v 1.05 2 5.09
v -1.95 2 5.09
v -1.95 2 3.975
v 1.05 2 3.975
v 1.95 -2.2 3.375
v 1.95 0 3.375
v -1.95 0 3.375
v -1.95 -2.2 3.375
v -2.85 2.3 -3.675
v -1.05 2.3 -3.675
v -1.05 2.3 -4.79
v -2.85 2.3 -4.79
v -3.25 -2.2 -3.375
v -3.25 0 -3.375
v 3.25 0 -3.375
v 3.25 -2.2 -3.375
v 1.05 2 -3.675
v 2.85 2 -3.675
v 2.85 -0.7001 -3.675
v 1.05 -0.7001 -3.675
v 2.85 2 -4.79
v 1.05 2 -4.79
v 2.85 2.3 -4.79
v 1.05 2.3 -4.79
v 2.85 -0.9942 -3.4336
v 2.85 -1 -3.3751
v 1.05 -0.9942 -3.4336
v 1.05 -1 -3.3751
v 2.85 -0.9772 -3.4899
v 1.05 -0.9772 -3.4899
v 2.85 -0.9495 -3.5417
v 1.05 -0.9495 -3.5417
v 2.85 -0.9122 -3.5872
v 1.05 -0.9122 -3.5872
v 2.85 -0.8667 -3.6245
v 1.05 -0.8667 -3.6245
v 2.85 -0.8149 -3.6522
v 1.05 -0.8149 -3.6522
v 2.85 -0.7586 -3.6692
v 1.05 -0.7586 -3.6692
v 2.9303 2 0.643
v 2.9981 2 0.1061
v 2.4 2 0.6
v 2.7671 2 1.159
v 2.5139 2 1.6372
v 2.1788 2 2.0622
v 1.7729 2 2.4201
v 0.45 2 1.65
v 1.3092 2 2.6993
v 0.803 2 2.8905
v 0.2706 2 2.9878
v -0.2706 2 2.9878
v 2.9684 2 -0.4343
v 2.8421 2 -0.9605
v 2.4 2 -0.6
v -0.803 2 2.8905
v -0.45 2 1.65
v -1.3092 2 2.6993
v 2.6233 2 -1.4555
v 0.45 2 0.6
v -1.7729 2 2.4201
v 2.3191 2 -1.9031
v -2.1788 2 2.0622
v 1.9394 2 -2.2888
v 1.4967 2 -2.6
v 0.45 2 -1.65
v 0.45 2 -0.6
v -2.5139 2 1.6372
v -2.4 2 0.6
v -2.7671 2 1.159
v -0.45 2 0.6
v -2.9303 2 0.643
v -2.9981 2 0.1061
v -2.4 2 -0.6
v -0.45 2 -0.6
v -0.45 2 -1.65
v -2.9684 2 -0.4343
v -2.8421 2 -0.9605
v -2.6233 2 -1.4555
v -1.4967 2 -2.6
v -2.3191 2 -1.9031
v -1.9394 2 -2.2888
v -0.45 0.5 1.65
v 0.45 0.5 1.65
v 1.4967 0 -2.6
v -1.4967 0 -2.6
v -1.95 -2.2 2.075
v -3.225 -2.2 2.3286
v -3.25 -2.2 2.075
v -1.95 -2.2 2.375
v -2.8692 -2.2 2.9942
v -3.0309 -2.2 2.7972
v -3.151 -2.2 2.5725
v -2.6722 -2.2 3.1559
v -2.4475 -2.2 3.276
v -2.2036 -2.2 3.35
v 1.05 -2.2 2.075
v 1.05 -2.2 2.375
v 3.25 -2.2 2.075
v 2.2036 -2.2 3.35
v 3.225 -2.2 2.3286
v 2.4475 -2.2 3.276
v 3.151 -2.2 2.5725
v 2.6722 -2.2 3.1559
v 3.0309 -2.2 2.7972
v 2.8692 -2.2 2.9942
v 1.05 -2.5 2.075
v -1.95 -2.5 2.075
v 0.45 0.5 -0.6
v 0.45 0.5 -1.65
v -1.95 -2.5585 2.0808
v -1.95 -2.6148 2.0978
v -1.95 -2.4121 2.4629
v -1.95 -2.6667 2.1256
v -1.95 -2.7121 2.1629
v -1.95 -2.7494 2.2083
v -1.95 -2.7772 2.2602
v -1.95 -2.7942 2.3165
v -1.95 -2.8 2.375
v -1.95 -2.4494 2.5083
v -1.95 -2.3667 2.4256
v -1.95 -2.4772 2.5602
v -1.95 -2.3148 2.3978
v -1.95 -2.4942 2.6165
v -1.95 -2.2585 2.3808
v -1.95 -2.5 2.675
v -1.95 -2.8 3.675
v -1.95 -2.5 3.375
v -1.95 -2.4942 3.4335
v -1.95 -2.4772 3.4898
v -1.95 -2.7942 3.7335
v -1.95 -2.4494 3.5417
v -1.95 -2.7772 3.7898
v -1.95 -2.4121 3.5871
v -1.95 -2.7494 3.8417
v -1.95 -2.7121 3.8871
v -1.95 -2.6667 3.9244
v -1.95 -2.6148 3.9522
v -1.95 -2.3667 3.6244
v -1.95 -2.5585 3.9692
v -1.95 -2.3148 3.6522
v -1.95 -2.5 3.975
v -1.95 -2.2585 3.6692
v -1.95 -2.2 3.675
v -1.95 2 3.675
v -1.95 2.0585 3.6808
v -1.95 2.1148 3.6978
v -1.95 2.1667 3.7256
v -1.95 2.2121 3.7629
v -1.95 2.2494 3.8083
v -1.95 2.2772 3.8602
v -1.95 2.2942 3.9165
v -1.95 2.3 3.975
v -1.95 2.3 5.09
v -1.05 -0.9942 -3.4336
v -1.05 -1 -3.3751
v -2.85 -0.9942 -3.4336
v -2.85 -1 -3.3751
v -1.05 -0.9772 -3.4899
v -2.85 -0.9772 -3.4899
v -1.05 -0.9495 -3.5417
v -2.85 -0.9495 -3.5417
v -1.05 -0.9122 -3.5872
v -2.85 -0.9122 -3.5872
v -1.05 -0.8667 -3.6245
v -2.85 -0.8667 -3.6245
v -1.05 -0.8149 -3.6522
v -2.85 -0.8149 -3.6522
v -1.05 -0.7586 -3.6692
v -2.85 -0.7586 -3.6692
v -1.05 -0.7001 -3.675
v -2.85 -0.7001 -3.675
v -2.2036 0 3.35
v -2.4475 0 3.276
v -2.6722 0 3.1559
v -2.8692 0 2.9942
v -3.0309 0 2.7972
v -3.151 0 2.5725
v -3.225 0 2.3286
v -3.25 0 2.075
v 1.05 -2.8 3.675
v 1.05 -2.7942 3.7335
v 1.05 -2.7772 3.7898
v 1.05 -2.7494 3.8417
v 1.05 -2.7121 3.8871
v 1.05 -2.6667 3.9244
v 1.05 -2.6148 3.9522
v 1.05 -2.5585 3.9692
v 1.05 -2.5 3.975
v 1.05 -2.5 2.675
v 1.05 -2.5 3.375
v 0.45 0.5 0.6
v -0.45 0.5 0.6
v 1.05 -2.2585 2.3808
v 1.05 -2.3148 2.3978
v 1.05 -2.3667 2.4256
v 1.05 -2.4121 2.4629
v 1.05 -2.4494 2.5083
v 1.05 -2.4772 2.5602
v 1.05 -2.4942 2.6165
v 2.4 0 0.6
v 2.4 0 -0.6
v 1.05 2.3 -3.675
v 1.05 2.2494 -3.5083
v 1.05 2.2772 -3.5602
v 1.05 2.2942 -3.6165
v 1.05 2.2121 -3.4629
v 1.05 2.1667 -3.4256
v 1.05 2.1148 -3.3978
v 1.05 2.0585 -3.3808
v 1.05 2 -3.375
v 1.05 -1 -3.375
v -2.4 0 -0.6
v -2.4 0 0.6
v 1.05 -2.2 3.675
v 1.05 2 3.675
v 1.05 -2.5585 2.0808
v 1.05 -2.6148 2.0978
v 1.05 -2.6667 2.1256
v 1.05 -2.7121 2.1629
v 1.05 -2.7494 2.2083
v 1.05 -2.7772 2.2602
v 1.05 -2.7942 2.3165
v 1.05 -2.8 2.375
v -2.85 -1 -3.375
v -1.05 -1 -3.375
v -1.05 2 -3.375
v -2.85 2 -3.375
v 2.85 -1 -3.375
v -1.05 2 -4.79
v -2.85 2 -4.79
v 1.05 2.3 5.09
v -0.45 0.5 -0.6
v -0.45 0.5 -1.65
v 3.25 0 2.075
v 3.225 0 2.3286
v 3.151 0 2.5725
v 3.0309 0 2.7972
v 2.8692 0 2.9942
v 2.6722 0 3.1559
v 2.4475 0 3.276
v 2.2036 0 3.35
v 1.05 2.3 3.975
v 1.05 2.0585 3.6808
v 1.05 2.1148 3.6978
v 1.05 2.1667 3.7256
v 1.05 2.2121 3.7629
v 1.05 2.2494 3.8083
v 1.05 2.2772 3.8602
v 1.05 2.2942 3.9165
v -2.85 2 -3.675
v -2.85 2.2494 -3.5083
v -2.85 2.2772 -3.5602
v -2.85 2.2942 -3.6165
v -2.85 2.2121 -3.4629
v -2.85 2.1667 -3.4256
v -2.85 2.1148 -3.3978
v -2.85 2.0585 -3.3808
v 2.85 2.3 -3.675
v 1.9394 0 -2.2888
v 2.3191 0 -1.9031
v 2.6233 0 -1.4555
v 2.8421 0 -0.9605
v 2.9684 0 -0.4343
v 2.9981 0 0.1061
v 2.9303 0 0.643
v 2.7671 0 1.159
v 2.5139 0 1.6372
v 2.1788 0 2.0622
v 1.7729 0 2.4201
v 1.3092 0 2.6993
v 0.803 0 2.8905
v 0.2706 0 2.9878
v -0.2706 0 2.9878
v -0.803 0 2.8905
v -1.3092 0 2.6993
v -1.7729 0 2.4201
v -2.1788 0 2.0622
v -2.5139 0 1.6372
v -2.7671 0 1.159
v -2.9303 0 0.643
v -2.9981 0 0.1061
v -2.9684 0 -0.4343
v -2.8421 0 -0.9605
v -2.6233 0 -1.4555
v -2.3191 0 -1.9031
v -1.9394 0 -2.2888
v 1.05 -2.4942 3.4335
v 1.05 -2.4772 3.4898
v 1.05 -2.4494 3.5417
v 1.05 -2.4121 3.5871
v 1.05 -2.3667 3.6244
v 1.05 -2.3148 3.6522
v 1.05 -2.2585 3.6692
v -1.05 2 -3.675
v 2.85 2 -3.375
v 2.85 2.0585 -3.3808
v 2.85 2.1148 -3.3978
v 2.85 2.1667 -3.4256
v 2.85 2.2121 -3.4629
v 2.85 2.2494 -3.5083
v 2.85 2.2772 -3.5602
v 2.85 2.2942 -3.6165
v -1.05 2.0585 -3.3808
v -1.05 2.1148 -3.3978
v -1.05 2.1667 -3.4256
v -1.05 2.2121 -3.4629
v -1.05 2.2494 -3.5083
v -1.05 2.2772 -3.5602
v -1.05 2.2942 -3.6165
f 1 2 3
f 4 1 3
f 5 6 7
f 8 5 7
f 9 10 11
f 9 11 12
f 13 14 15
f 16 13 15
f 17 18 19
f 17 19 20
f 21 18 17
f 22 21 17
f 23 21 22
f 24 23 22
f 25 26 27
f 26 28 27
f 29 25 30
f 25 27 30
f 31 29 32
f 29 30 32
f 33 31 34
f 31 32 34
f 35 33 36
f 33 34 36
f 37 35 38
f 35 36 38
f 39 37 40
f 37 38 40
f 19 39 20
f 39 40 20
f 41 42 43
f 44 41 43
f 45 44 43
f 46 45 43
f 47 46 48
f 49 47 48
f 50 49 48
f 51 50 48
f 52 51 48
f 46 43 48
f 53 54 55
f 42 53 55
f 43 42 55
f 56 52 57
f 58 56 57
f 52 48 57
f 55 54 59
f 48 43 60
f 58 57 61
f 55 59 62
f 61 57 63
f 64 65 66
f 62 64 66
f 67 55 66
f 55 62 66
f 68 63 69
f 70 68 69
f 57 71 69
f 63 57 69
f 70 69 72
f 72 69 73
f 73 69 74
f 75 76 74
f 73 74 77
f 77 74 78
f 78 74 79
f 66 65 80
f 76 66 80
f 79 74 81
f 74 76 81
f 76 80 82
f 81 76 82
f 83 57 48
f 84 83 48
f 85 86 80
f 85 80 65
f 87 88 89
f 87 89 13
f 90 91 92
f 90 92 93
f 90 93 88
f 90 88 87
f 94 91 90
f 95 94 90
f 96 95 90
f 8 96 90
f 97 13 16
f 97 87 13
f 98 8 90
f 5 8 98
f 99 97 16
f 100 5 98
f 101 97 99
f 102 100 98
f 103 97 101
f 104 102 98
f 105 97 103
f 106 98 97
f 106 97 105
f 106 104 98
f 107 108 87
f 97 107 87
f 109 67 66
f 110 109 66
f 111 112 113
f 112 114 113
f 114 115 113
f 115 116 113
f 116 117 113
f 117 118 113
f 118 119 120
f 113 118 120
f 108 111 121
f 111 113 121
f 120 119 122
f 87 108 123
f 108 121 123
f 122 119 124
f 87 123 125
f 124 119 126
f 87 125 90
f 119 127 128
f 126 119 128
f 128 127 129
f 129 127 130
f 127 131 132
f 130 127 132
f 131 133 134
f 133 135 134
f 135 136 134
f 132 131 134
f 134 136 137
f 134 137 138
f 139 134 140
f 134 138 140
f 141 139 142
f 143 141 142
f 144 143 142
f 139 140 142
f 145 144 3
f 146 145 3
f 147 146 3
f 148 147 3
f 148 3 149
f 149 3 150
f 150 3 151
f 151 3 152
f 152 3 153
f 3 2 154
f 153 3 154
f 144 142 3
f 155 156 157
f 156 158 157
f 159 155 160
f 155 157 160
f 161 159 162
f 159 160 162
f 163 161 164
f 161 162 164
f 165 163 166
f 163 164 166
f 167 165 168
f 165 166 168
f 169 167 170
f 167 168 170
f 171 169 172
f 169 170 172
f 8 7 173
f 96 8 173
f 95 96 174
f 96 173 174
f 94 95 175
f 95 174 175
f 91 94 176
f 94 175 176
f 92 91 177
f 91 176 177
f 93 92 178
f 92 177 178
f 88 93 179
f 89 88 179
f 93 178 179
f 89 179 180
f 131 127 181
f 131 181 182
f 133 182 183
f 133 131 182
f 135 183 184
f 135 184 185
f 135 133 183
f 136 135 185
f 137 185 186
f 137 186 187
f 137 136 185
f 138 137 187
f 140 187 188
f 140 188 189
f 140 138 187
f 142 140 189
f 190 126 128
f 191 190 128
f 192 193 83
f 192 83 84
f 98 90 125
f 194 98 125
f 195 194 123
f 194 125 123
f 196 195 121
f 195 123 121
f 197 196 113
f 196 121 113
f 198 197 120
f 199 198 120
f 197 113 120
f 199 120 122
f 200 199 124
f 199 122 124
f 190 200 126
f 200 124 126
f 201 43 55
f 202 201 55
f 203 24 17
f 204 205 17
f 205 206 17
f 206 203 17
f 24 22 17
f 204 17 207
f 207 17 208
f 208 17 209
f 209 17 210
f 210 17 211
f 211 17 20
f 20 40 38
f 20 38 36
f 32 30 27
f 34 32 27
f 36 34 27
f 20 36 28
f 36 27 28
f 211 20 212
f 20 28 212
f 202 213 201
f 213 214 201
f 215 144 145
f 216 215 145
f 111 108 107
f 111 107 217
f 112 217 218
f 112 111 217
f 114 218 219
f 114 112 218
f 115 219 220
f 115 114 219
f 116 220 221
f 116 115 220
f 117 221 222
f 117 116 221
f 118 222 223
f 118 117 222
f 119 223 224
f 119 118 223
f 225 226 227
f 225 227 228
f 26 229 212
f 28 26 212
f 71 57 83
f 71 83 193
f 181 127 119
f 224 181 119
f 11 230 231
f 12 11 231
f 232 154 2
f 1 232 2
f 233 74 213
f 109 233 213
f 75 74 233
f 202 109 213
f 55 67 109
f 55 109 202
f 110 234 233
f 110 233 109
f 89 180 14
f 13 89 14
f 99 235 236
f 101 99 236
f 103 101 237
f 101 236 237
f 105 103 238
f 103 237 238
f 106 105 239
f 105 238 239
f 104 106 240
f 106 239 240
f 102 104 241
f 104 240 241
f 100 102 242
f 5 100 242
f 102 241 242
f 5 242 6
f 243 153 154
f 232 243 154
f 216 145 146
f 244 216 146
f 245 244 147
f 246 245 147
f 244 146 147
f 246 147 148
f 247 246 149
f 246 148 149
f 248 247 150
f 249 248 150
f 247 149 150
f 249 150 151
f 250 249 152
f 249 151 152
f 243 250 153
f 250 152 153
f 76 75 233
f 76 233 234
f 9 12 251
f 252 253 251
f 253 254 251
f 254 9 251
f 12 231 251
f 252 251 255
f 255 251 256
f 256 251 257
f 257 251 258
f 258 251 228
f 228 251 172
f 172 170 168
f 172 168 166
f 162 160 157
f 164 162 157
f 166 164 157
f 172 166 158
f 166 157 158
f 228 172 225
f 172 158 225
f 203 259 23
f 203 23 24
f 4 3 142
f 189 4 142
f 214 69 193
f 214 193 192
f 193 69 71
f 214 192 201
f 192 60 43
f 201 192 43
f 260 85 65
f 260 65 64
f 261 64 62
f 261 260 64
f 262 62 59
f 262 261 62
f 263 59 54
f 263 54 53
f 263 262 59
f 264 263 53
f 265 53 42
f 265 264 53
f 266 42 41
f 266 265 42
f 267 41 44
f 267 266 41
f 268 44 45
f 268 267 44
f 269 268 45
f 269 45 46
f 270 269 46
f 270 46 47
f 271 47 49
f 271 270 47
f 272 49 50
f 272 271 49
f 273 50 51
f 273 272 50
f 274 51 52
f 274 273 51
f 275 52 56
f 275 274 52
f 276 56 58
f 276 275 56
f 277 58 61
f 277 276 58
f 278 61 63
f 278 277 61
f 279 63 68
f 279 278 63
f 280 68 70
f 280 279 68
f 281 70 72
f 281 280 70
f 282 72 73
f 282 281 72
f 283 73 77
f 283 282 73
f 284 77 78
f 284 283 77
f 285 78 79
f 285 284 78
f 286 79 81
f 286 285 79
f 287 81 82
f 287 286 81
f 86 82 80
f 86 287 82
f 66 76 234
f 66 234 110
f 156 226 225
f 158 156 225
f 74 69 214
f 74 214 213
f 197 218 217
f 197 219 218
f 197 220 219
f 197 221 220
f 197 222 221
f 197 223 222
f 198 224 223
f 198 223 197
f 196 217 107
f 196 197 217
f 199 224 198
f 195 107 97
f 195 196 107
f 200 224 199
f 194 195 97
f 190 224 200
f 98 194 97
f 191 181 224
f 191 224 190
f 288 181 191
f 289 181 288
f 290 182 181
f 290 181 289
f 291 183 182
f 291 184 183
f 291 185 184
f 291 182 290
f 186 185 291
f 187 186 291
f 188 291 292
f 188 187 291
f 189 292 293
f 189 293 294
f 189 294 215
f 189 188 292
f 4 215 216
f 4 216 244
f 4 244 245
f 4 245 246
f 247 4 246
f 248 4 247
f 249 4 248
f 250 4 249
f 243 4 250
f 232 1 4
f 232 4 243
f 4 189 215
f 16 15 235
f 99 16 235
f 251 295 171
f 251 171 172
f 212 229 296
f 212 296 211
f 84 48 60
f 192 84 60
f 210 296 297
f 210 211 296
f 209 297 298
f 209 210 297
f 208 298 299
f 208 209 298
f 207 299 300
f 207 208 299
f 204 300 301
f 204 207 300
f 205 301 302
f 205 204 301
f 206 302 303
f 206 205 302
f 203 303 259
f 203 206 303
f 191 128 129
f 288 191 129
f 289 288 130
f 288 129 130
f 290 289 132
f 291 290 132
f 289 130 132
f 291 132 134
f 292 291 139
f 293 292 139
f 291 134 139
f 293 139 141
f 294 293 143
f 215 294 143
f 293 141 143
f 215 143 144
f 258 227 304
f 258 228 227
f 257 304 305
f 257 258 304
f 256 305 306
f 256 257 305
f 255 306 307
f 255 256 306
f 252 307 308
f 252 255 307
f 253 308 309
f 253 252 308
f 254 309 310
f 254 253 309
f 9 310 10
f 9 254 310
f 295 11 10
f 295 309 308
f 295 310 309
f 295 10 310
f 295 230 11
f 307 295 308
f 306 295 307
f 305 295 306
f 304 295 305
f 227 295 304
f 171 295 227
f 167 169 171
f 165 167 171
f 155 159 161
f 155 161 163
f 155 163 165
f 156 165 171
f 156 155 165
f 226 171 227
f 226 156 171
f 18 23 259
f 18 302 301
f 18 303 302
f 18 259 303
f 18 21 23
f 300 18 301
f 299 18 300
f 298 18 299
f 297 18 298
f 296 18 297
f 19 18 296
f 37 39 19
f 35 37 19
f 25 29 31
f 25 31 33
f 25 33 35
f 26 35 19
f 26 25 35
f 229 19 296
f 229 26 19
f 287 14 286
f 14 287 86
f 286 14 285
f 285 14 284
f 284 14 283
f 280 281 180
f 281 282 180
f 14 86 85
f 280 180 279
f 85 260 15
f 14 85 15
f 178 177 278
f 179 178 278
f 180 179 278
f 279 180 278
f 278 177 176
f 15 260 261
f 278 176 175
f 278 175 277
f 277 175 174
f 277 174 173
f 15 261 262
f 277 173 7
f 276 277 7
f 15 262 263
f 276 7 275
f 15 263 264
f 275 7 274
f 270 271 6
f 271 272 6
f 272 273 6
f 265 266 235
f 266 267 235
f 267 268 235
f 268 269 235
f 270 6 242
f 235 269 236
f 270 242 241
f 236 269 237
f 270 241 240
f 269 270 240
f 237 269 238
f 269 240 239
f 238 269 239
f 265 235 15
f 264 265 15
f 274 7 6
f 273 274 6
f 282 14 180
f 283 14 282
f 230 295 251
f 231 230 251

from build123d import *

# Parameters (mm, degrees)
BOSS_EXTRUDE1_DEPTH   = 2
SKETCH2_W             = 4.8
SKETCH2_H             = 1.2
CUT_EXTRUDE1_DEPTH    = 5.69041576
SKETCH3_W             = 0.9
SKETCH3_H             = 3.3
CUT_EXTRUDE2_DEPTH    = 1.5
BOSS_EXTRUDE2_DEPTH   = 2.2
SKETCH9_W             = 1.8
SKETCH9_H             = 3
BOSS_EXTRUDE6_DEPTH   = 0.3
BOSS_EXTRUDE6_2_DEPTH = 0.3
FILLET4_R             = 0.3
FILLET5_R             = 0.3
SKETCH10_W            = 1.8
SKETCH10_H            = 1.415
BOSS_EXTRUDE7_DEPTH   = 0.3
FILLET6_R             = 0.3
FILLET7_R             = 0.3
BOSS_EXTRUDE8_START   = -1.95
BOSS_EXTRUDE8_DEPTH   = 3
FILLET8_START         = -3
FILLET8_DEPTH         = 5
FILLET8_START_2       = -1.95
FILLET8_2_DEPTH       = 3


with BuildPart() as part:
    # Sketch1 → Boss-Extrude1 (new body)
    with BuildSketch(Plane(origin=(0, 0, 0), x_dir=(1, 0, 0), z_dir=(0, 1, 0))):
        with BuildLine():
            Line((-1.496662955, 2.6), (1.496662955, 2.6))
            ThreePointArc((1.496662955, 2.6), (0, -3), (-1.496662955, 2.6))
        make_face()
    extrude(amount=BOSS_EXTRUDE1_DEPTH)

    # Sketch2 → Cut-Extrude1 (cut, through all)
    with BuildSketch(Plane(origin=(0, 2, 0), x_dir=(1, 0, 0), z_dir=(0, 1, 0))):
        Rectangle(SKETCH2_W, SKETCH2_H)
    extrude(amount=-CUT_EXTRUDE1_DEPTH, mode=Mode.SUBTRACT)

    # Sketch3 → Cut-Extrude2 (cut)
    with BuildSketch(Plane(origin=(0, 2, 0), x_dir=(1, 0, 0), z_dir=(0, 1, 0))):
        Rectangle(SKETCH3_W, SKETCH3_H)
    extrude(amount=-CUT_EXTRUDE2_DEPTH, mode=Mode.SUBTRACT)



with BuildPart() as body_2:
    # Sketch4 → Boss-Extrude2 (new body)
    with BuildSketch(Plane.XZ):
        with BuildLine():
            Line((-3.25, -3.375), (3.25, -3.375))
            Line((3.25, -3.375), (3.25, 2.075))
            ThreePointArc((3.25, 2.075), (2.869238816, 2.994238816), (1.95, 3.375))
            Line((1.95, 3.375), (-1.95, 3.375))
            ThreePointArc((-1.95, 3.375), (-2.869238816, 2.994238816), (-3.25, 2.075))
            Line((-3.25, 2.075), (-3.25, -3.375))
        make_face()
    extrude(amount=BOSS_EXTRUDE2_DEPTH)


with BuildPart() as body_3:
    # Sketch9 → Boss-Extrude6 (new body)
    with BuildSketch(Plane(origin=(0, 0, -3.375), x_dir=(-1, 0, 0), z_dir=(0, 0, -1))):
        with Locations((-1.95, 0.5)):
            Rectangle(SKETCH9_W, SKETCH9_H)
    extrude(amount=BOSS_EXTRUDE6_DEPTH)

    # Fillet4
    fillet4_edges = [body_3.edges().sort_by_distance(p)[0] for p in [
        (1.95, -1, -3.675),
    ]]
    fillet(fillet4_edges, radius=FILLET4_R - 0.0001)  # a hair under: the kernel refuses the full size



with BuildPart() as body_4:
    # Sketch9 → Boss-Extrude6 2 (new body)
    with BuildSketch(Plane(origin=(0, 0, -3.375), x_dir=(-1, 0, 0), z_dir=(0, 0, -1))):
        with Locations((1.95, 0.5)):
            Rectangle(SKETCH9_W, SKETCH9_H)
    extrude(amount=BOSS_EXTRUDE6_2_DEPTH)

    # Fillet5
    fillet5_edges = [body_4.edges().sort_by_distance(p)[0] for p in [
        (-1.95, -1, -3.675),
    ]]
    fillet(fillet5_edges, radius=FILLET5_R - 0.0001)  # a hair under: the kernel refuses the full size


with BuildPart() as body_3_1:
    add(body_3.part)

    add(body_4.part)  # Boss-Extrude7 merges body 4
    # Sketch10 → Boss-Extrude7 (add)
    with BuildSketch(Plane(origin=(0, 2, 0), x_dir=(-1, 0, 0), z_dir=(0, 1, 0))):
        with Locations((1.95, -4.0825)):
            Rectangle(SKETCH10_W, SKETCH10_H)
        with Locations((-1.95, -4.0825)):
            Rectangle(SKETCH10_W, SKETCH10_H)
    extrude(amount=BOSS_EXTRUDE7_DEPTH)

    # Fillet6
    fillet6_edges = [body_3_1.edges().sort_by_distance(p)[0] for p in [
        (-1.95, 2.3, -3.375),
    ]]
    fillet(fillet6_edges, radius=FILLET6_R)

    # Fillet7
    fillet7_edges = [body_3_1.edges().sort_by_distance(p)[0] for p in [
        (1.95, 2.3, -3.375),
    ]]
    fillet(fillet7_edges, radius=FILLET7_R)


with BuildPart() as part_1:
    add(part.part)

    add(body_2.part)  # Boss-Extrude8 merges body 2
    # Sketch11 → Boss-Extrude8 (add)
    with BuildSketch(Plane(origin=(0, 0, 0), x_dir=(0, 0, -1), z_dir=(1, 0, 0)).offset(BOSS_EXTRUDE8_START)):
        with BuildLine():
            Line((-2.375, -2.2), (-2.375, -2.5))
            Line((-2.375, -2.5), (-3.675, -2.5))
            Line((-3.675, -2.5), (-3.675, 2))
            ThreePointArc((-3.675, 2), (-3.762867966, 2.212132034), (-3.975, 2.3))
            Line((-3.975, 2.3), (-5.09, 2.3))
            Line((-5.09, 2.3), (-5.09, 2))
            Line((-5.09, 2), (-3.975, 2))
            Line((-3.975, 2), (-3.975, -2.8))
            Line((-3.975, -2.8), (-2.075, -2.8))
            Line((-2.075, -2.8), (-2.075, -2.2))
            Line((-2.075, -2.2), (-2.375, -2.2))
        make_face()
    extrude(amount=BOSS_EXTRUDE8_DEPTH)

    # Fillet8: read off the stored shape, not the designer's step
    # Fillet8 outline → Fillet8 (cut)
    with BuildSketch(Plane.YZ.offset(FILLET8_START)):
        with BuildLine():
            Line((-2.8, 2.075), (-2.5, 2.075))
            ThreePointArc((-2.5, 2.075), (-2.712132034, 2.162867966), (-2.8, 2.375))
            Line((-2.8, 2.375), (-2.8, 2.075))
        make_face()
        with BuildLine():
            Line((-2.8, 3.975), (-2.8, 3.675))
            ThreePointArc((-2.8, 3.675), (-2.712132034, 3.887132034), (-2.5, 3.975))
            Line((-2.5, 3.975), (-2.8, 3.975))
        make_face()
    extrude(amount=FILLET8_DEPTH, mode=Mode.SUBTRACT)

    # Fillet8 2 outline → Fillet8 2 (add)
    with BuildSketch(Plane.YZ.offset(FILLET8_START_2)):
        with BuildLine():
            ThreePointArc((-2.2, 2.375), (-2.412132034, 2.462867966), (-2.5, 2.675))
            Line((-2.5, 2.675), (-2.5, 2.375))
            Line((-2.5, 2.375), (-2.2, 2.375))
        make_face()
        with BuildLine():
            ThreePointArc((-2.5, 3.375), (-2.412132034, 3.587132034), (-2.2, 3.675))
            Line((-2.2, 3.675), (-2.5, 3.675))
            Line((-2.5, 3.675), (-2.5, 3.375))
        make_face()
    extrude(amount=FILLET8_2_DEPTH)


solid = Compound([body_3_1.part, part_1.part])
